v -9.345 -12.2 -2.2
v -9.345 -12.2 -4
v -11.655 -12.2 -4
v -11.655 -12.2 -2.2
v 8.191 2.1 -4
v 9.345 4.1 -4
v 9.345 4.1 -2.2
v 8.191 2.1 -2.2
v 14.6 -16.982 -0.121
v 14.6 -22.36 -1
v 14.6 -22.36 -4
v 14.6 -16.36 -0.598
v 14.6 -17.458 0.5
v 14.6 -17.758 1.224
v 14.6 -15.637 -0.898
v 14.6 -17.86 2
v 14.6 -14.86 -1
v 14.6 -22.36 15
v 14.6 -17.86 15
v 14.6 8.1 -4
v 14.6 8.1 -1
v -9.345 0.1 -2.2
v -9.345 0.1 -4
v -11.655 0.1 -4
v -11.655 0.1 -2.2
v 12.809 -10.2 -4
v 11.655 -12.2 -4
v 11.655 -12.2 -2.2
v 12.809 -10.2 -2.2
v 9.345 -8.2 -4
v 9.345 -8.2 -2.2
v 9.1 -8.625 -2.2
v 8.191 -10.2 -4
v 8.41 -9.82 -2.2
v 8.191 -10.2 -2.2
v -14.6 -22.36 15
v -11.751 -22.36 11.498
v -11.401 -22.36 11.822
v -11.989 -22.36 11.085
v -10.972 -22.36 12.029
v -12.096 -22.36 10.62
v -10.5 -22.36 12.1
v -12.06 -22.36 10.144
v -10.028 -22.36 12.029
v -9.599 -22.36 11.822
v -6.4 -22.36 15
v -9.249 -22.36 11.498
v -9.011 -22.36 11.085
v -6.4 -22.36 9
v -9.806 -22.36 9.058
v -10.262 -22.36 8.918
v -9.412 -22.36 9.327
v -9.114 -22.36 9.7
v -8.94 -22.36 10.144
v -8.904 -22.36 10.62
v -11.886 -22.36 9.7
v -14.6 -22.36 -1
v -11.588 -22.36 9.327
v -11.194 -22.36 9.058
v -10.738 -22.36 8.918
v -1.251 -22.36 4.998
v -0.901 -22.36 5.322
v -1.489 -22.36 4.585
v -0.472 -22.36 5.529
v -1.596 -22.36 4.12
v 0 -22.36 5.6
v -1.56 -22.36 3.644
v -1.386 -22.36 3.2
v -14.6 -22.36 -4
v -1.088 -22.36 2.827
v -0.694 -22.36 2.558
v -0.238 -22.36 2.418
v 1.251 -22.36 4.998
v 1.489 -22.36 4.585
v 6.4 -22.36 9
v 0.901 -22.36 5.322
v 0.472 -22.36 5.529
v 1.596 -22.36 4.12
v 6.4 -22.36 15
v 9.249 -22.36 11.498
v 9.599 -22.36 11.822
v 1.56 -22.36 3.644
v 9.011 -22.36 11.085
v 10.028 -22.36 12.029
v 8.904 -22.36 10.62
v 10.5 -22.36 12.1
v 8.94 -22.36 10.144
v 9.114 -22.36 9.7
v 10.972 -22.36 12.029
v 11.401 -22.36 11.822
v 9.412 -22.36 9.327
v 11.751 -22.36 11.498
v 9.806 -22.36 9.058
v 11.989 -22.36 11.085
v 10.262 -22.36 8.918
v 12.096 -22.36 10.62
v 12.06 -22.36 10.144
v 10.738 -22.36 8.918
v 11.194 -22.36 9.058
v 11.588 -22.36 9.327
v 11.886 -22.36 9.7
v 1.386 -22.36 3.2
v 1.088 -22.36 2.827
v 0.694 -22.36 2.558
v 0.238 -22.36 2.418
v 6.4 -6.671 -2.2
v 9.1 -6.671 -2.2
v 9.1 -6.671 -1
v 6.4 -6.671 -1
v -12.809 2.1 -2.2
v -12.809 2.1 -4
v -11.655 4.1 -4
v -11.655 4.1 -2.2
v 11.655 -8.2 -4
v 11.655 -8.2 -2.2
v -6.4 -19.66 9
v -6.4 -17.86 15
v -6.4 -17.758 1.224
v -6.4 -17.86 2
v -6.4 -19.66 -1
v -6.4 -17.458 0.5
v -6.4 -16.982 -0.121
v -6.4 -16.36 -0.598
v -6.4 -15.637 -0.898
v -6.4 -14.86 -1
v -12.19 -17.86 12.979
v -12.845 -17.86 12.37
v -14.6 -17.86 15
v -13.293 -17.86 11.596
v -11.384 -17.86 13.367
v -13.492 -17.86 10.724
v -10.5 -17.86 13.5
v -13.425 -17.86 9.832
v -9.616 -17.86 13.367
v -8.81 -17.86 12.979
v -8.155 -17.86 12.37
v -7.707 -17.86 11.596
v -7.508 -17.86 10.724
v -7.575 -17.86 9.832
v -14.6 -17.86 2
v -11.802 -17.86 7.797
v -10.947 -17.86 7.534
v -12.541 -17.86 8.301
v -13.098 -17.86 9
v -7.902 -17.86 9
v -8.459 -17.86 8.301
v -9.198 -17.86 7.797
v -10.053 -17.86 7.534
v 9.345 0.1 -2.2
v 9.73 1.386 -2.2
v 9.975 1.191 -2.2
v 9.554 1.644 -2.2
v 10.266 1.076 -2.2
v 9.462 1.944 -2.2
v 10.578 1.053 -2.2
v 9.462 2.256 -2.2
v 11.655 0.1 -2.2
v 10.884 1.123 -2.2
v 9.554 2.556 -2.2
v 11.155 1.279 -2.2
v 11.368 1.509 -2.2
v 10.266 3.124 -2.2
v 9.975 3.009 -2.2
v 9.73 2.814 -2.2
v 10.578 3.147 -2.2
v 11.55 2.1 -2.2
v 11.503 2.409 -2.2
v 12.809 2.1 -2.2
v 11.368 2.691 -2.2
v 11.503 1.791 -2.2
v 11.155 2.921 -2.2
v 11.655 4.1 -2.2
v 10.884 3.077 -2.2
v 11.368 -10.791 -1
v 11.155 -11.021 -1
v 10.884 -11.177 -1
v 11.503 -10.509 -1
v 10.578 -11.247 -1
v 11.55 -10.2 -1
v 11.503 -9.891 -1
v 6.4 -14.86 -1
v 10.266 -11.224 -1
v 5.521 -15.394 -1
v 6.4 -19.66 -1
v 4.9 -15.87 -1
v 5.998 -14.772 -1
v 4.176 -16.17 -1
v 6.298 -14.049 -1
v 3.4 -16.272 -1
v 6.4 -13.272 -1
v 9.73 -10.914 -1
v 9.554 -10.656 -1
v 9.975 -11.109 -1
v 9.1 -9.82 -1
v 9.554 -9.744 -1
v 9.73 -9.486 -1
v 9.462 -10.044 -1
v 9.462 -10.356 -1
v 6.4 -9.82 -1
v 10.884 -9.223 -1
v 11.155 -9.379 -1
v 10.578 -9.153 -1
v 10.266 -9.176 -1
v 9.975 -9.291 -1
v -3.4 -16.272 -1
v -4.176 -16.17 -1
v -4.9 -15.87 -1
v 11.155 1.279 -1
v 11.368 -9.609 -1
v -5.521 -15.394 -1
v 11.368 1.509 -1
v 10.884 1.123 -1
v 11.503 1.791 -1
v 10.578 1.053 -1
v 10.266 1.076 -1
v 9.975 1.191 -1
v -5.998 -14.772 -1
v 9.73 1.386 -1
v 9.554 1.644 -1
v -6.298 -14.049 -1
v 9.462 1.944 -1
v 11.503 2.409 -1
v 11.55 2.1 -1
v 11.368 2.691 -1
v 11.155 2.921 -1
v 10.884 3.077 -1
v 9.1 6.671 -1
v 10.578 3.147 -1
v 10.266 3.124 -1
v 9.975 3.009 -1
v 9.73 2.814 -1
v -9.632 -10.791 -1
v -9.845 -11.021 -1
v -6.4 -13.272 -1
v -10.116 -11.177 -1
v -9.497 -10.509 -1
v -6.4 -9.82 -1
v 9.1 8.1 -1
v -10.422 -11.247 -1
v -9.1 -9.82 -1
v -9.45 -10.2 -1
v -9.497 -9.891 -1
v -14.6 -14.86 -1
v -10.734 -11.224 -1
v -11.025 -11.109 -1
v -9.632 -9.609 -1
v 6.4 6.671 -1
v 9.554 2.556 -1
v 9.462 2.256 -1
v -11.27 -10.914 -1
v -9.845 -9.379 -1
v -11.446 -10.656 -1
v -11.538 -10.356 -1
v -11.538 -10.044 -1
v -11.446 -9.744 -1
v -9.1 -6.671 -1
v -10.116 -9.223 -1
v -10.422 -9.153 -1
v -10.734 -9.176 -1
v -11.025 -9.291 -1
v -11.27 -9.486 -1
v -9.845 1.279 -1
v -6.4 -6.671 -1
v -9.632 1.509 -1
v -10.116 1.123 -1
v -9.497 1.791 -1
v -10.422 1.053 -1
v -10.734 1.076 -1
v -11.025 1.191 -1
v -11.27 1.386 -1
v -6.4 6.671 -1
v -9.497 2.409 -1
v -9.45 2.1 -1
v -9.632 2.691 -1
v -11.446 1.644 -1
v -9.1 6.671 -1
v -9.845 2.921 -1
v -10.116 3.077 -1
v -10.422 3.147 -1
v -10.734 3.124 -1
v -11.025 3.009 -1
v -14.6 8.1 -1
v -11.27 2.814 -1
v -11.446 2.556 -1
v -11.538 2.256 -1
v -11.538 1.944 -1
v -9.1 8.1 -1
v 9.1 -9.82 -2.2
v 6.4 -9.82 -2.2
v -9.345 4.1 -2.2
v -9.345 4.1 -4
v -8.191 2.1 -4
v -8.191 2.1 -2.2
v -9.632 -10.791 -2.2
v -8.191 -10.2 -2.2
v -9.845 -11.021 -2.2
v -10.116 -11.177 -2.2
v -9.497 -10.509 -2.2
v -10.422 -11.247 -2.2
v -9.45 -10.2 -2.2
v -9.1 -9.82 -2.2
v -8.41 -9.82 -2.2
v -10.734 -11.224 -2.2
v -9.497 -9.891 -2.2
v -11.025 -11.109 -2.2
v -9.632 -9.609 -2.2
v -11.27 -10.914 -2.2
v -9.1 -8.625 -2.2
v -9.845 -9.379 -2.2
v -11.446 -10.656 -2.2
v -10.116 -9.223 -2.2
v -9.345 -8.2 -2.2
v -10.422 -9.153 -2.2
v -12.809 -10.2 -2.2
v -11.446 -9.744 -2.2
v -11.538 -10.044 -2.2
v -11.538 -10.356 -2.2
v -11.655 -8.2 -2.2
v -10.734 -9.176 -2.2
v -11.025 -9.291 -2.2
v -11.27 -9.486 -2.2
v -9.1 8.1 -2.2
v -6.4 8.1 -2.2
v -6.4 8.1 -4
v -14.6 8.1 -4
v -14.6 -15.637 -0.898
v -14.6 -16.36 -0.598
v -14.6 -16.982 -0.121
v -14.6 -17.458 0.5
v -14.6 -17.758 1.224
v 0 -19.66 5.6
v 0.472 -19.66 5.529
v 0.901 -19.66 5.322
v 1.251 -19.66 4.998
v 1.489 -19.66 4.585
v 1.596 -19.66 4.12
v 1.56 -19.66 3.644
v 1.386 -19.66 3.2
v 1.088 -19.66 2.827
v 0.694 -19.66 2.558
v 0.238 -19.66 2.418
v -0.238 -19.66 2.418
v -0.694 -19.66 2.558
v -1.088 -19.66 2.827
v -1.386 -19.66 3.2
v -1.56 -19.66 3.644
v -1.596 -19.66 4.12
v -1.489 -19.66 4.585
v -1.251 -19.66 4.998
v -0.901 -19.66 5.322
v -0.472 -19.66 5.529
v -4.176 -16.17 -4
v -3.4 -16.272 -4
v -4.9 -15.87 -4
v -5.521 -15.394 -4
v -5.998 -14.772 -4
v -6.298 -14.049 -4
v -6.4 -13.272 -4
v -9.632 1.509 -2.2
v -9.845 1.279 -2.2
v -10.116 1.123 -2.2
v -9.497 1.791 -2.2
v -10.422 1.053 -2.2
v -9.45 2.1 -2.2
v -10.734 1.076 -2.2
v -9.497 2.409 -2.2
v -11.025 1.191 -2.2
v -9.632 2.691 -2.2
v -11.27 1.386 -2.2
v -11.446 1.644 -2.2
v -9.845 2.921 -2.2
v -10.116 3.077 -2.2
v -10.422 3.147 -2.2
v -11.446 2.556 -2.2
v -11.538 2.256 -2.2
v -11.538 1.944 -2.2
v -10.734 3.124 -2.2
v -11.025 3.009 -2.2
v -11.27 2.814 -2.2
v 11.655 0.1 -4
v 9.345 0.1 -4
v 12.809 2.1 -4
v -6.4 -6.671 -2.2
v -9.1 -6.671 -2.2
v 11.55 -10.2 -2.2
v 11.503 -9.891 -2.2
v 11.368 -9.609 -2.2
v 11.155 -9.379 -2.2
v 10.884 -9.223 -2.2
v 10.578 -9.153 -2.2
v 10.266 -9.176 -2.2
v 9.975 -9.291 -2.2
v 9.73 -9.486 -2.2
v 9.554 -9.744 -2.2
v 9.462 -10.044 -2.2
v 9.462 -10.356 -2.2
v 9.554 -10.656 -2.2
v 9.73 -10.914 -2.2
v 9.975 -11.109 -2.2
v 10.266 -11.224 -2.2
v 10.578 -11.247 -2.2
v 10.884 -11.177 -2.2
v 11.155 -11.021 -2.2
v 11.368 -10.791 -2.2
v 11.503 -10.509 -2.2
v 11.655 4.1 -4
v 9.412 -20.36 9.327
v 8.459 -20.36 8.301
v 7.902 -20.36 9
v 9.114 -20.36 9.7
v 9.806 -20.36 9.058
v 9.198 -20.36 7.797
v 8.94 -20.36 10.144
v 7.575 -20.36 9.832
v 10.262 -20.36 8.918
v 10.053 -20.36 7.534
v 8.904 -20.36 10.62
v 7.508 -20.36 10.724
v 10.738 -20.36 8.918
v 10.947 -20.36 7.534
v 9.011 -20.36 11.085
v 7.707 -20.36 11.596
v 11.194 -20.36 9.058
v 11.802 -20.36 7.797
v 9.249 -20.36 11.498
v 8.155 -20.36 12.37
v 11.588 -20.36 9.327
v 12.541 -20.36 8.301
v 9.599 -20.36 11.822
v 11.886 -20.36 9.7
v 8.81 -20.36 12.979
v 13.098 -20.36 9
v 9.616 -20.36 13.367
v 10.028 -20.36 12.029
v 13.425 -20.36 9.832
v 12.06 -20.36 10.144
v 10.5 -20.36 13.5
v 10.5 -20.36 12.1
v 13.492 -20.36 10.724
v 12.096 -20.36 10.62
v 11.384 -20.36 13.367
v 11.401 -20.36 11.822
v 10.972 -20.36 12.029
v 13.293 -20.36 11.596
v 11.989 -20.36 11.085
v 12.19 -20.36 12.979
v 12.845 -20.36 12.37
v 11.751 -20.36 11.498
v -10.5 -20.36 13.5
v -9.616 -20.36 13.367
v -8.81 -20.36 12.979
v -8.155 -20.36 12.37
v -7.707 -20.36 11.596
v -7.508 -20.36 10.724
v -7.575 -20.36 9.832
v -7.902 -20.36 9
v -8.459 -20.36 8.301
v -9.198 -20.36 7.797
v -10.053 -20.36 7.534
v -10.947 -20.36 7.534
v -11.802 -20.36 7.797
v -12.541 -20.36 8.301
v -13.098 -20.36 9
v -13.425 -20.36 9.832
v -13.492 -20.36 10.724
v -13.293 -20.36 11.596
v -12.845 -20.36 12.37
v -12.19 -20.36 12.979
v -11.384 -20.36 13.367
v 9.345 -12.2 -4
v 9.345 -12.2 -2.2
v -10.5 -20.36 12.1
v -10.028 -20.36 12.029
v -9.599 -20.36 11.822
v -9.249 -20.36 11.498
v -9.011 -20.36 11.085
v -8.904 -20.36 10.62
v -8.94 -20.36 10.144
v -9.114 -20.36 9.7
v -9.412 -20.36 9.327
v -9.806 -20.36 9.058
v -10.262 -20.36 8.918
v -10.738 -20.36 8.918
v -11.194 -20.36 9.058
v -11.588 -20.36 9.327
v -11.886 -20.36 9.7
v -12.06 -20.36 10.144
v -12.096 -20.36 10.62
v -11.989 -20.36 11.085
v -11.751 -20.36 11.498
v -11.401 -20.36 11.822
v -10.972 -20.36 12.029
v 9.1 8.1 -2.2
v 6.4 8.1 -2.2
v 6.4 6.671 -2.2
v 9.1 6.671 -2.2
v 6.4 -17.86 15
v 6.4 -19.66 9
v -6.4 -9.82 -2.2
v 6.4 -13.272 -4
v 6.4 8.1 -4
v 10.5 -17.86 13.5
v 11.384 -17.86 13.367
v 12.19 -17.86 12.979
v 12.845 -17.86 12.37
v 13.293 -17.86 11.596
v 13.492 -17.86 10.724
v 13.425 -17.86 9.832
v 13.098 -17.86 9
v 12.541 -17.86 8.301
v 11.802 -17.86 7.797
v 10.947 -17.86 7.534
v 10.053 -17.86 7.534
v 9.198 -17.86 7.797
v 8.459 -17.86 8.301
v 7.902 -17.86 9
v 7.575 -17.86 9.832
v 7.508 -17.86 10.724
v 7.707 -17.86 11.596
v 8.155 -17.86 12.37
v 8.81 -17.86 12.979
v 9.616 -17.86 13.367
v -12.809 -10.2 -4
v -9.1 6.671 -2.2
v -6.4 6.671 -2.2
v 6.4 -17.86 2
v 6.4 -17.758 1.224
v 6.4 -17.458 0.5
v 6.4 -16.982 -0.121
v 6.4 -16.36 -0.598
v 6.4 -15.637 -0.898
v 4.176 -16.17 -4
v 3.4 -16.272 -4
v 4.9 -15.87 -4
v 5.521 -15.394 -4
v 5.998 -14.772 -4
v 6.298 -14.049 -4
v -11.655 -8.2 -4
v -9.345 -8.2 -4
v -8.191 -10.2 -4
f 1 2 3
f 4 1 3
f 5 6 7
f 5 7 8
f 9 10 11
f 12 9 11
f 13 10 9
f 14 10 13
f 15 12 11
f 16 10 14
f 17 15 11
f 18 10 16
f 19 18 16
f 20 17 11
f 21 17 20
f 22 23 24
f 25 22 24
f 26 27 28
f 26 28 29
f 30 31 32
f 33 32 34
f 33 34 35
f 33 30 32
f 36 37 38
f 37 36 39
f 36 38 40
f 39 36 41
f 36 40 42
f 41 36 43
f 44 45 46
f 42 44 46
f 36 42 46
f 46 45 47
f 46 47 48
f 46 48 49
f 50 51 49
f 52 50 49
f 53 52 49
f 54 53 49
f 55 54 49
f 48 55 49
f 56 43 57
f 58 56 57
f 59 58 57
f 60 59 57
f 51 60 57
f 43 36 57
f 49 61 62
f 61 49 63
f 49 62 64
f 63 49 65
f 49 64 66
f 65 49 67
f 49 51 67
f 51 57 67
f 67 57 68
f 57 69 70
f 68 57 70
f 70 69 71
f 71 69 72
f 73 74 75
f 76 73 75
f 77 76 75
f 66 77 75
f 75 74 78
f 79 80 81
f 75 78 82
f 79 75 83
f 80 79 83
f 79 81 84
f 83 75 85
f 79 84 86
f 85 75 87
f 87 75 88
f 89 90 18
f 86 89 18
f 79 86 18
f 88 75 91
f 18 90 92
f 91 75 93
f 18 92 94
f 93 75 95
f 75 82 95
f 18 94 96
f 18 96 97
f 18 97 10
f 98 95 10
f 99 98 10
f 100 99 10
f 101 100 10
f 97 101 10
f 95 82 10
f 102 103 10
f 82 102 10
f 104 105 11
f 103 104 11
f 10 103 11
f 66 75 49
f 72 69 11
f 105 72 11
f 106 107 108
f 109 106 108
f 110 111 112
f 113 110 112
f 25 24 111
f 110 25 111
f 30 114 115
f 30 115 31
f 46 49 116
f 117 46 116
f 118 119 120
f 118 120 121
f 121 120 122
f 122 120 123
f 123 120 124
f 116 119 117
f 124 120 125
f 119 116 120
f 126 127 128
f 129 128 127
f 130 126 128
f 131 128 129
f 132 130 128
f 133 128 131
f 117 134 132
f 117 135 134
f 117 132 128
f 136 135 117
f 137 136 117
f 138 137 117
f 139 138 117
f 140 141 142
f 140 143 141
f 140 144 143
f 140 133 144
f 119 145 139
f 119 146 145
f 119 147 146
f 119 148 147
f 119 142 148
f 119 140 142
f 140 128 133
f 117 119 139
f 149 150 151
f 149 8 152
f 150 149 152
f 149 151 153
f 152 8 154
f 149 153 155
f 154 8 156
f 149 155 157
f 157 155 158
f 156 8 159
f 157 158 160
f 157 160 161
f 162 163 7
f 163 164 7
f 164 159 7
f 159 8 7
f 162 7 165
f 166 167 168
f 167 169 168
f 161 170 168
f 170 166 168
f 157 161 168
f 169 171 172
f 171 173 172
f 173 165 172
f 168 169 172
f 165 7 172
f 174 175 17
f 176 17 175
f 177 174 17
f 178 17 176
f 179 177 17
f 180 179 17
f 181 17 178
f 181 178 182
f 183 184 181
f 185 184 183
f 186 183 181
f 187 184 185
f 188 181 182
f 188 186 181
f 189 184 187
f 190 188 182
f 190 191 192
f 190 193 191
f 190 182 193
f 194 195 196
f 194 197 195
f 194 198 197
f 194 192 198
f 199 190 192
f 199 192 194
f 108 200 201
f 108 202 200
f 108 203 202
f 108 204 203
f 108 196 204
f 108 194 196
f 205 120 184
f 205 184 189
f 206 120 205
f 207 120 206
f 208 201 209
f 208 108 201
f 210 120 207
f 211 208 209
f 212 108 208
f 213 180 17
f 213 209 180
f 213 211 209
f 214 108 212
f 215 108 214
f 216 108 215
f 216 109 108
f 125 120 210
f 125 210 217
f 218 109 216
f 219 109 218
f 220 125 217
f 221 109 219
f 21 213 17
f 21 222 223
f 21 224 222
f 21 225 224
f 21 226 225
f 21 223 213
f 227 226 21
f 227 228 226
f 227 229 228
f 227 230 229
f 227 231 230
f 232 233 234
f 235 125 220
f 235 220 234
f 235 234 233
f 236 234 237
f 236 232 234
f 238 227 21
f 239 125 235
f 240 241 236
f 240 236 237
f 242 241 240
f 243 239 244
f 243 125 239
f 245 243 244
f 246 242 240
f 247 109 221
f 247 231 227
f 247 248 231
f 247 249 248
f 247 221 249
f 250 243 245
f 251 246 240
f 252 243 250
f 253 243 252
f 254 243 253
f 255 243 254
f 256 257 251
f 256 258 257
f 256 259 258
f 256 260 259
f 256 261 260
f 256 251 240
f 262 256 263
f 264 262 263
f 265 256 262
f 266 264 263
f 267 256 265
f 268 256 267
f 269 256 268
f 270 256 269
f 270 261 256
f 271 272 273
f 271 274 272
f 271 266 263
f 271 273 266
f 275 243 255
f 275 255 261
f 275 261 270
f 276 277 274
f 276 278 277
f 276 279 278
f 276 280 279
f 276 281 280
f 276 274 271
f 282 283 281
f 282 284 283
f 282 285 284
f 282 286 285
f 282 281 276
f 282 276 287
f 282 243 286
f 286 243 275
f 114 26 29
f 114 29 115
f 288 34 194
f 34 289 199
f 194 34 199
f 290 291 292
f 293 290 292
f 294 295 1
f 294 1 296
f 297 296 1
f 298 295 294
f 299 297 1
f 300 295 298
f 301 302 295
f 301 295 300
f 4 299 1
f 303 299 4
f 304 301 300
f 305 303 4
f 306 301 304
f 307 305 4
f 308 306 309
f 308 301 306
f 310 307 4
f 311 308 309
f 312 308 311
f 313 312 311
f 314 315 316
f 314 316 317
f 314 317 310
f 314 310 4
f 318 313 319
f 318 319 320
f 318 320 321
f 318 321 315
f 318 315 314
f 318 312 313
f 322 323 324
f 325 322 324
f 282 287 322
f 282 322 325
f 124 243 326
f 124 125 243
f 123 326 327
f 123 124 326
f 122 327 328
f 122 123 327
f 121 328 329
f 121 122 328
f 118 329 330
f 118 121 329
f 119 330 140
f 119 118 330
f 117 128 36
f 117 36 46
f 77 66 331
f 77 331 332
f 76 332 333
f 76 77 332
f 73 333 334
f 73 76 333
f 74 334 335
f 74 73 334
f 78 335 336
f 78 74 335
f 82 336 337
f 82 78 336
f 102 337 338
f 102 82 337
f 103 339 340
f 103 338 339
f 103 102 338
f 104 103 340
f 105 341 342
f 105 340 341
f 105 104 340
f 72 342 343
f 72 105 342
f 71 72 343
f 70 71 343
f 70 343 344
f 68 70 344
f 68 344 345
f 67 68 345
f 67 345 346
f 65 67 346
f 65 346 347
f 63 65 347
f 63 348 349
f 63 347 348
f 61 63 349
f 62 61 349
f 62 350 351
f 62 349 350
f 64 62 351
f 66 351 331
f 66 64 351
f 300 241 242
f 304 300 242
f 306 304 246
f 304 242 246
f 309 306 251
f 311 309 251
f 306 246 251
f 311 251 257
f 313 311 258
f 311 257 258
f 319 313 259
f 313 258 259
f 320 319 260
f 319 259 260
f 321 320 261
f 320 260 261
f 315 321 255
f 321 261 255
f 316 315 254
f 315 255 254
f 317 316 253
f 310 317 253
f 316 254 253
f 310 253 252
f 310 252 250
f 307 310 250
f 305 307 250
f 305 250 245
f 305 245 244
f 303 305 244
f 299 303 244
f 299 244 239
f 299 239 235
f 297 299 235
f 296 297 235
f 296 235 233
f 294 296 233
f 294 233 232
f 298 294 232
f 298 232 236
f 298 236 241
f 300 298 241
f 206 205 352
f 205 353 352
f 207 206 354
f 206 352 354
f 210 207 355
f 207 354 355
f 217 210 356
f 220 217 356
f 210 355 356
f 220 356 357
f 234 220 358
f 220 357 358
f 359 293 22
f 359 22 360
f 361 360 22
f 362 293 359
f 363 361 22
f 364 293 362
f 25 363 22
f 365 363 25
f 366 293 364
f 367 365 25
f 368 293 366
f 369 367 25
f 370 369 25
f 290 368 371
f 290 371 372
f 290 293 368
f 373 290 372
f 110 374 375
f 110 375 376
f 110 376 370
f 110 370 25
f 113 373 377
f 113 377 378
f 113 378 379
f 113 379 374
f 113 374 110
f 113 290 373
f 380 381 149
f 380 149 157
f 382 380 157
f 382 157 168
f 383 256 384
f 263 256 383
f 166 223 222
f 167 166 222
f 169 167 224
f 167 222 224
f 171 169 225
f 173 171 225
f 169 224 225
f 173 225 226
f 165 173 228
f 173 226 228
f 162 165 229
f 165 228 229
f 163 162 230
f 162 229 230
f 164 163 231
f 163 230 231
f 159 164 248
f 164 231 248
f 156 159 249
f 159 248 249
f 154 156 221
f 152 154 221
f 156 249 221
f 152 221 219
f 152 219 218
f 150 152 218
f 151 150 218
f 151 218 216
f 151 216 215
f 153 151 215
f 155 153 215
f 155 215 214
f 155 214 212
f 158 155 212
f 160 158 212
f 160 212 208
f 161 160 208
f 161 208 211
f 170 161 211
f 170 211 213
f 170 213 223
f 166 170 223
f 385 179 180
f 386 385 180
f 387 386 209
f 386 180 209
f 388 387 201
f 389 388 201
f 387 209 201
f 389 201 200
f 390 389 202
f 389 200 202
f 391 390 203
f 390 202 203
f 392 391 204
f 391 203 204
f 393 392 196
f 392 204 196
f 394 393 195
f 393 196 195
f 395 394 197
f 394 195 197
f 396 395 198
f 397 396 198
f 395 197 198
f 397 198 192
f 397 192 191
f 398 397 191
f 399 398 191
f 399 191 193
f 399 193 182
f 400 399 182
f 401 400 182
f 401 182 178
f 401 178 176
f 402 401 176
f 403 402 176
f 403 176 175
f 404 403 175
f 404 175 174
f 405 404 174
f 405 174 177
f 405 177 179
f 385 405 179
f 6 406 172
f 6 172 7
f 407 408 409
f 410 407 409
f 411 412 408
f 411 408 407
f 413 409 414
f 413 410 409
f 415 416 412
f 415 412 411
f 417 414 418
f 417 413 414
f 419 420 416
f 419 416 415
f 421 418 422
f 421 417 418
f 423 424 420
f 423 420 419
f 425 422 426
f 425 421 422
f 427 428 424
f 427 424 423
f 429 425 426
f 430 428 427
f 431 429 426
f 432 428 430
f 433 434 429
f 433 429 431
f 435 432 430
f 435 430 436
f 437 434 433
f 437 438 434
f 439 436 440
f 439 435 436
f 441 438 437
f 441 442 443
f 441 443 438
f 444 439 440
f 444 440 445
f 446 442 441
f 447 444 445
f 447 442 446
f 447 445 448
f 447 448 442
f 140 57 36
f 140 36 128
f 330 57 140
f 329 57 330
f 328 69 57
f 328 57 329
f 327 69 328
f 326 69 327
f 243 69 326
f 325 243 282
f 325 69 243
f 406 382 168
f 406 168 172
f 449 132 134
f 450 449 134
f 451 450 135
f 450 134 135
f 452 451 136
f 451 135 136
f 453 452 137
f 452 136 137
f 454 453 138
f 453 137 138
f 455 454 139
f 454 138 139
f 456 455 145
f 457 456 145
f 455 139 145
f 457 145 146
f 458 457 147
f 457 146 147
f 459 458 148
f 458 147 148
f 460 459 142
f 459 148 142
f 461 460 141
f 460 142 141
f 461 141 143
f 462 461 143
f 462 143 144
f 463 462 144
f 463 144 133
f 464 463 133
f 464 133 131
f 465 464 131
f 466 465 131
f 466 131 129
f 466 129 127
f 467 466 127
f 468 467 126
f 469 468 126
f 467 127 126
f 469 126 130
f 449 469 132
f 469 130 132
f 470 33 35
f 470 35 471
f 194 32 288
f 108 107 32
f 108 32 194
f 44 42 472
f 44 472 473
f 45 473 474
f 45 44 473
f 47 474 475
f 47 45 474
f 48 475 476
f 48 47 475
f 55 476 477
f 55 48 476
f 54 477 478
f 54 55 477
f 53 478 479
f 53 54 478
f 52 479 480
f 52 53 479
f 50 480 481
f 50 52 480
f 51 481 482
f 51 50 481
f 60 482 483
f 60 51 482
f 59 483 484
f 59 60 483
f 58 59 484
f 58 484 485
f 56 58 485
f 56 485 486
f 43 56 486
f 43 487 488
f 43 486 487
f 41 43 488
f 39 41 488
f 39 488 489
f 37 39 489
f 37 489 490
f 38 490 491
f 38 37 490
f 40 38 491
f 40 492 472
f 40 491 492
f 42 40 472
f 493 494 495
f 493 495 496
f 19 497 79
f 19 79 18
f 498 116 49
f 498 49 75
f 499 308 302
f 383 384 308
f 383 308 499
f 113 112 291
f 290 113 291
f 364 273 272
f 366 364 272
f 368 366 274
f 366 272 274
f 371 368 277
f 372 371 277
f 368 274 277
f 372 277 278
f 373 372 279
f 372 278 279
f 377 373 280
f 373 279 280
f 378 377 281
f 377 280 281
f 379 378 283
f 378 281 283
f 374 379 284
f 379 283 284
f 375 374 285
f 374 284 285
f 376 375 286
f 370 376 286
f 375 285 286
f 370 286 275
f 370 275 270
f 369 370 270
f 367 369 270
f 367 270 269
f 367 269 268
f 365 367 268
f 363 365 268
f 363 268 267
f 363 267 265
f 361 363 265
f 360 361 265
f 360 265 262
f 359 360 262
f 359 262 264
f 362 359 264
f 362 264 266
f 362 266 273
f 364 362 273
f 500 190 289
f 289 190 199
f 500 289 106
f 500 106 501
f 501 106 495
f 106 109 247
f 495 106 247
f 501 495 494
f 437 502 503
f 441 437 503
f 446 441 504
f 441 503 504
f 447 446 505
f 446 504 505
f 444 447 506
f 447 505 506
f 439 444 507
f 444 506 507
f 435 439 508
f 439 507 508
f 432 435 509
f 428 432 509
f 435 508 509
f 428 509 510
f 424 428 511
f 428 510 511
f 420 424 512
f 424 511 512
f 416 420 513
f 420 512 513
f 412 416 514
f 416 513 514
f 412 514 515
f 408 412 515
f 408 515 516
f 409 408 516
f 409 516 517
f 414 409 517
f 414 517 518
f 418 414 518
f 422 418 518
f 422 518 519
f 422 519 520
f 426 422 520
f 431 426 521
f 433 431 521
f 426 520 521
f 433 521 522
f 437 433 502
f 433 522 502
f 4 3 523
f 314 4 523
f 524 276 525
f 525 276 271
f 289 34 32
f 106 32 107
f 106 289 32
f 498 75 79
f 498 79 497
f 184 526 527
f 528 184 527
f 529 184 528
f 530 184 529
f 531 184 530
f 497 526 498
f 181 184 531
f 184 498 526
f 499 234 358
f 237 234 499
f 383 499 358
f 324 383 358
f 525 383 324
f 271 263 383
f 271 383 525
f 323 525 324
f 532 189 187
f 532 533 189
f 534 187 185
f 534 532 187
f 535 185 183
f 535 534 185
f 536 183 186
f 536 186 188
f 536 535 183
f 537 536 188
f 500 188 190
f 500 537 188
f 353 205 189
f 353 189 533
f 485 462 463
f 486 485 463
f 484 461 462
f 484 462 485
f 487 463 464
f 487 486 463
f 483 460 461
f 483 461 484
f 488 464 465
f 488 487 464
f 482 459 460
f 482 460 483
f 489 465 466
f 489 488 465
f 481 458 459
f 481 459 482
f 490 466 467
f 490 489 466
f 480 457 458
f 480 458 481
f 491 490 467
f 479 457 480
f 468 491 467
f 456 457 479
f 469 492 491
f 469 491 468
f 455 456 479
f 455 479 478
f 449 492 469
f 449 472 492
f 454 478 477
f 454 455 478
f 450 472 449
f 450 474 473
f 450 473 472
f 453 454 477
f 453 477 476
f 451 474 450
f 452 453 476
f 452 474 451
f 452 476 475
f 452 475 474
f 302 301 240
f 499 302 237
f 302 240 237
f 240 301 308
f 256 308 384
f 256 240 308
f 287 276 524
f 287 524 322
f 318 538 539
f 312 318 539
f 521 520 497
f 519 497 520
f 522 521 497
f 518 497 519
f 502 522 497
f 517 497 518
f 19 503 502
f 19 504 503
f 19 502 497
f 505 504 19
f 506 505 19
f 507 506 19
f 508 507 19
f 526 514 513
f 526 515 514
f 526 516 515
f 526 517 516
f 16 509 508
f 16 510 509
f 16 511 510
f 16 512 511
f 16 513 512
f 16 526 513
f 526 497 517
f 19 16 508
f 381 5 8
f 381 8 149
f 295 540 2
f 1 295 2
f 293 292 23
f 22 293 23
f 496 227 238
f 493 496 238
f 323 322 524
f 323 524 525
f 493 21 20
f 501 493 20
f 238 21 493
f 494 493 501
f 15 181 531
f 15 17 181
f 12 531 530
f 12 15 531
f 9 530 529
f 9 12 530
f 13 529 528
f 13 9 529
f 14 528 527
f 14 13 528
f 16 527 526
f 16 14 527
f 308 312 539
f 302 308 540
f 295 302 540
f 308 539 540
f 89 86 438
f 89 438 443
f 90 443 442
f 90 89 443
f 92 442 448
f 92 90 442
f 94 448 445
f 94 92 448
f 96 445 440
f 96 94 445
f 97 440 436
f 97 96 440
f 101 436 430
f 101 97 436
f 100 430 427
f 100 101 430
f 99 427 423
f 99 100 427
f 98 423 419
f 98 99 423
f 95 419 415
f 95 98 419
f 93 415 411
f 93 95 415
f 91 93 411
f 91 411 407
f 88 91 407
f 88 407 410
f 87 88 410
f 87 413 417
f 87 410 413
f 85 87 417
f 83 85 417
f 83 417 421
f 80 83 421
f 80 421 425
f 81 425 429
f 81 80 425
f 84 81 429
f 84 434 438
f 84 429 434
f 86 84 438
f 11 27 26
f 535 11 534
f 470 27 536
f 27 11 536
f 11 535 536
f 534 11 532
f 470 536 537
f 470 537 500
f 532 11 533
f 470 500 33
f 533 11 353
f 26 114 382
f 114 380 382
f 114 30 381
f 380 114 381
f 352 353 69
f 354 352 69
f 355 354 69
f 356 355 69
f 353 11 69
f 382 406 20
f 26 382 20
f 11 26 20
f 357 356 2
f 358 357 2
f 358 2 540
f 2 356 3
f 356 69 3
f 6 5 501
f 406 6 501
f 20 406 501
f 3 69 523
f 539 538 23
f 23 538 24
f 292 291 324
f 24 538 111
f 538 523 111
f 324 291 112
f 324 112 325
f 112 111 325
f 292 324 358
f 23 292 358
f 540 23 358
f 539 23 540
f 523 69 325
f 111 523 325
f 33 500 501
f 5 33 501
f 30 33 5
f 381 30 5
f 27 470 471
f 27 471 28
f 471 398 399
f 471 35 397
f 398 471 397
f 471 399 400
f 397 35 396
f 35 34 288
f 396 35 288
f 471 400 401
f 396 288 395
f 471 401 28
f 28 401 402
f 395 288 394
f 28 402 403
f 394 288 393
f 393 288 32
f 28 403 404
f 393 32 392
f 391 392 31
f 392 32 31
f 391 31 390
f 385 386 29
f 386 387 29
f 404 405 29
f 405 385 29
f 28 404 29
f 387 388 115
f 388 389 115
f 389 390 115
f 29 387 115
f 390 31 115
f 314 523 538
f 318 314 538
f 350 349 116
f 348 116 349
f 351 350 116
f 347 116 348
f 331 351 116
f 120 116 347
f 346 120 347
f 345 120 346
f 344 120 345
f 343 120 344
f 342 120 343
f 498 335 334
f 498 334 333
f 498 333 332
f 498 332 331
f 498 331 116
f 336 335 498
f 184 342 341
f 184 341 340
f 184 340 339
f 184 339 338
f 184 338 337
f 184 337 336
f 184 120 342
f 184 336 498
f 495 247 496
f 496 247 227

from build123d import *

# Parameters (mm, degrees)
ESBO_O2_W                  = 8.2
ESBO_O2_H                  = 30.460387467
RESSALTO_EXTRUS_O1_DEPTH   = 3
RESSALTO_EXTRUS_O1_2_DEPTH = 3
RESSALTO_EXTRUS_O2_REACH   = 32.935
ESBO_O3_W                  = 3
ESBO_O3_H                  = 6.088150409
ESBO_O4_W                  = 12.8
ESBO_O4_H                  = 2.7
RESSALTO_EXTRUS_O3_DEPTH   = 10
ESBO_O5_W                  = 8.2
ESBO_O5_H                  = 4.5
RESSALTO_EXTRUS_O4_DEPTH   = 16
CORTE_EXTRUS_O1_DEPTH      = 34.348189118
CORTE_EXTRUS_O1_DEPTH_BACK = 34.348189118
ESBO_O6_R                  = 1.6
ESBO_O7_R                  = 3
CORTE_EXTRUS_O2_DEPTH      = 2.5
ESBO_O8_R                  = 1.05
CORTE_EXTRUS_O3_DEPTH      = 32.131124741
FILETE1_R                  = 3
ESBO_O9_W                  = 1.2
ESBO_O9_H                  = 3.148787123
CORTE_EXTRUS_O4_DEPTH      = 2.7
FILETE2_R                  = 3
CORTE_EXTRUS_O5_DEPTH      = 1.8
ESBO_O13_W                 = 2.7
ESBO_O13_H                 = 3.148787123
CORTE_EXTRUS_O7_DEPTH      = 1.2


with BuildPart() as part:
    # Esboço2 → Ressalto-extrusão1 (new body)
    with BuildSketch(Plane(origin=(0, 0, -1), x_dir=(-1, 0, 0), z_dir=(0, 0, -1))):
        with Locations((10.5, -7.130193734)):
            Rectangle(ESBO_O2_W, ESBO_O2_H)
    extrude(amount=RESSALTO_EXTRUS_O1_DEPTH)


with BuildPart() as body_2:
    # Esboço2 → Ressalto-extrus_o1 2 (new body)
    with BuildSketch(Plane(origin=(0, 0, -1), x_dir=(-1, 0, 0), z_dir=(0, 0, -1))):
        with Locations((-10.5, -7.130193734)):
            Rectangle(ESBO_O2_W, ESBO_O2_H)
    extrude(amount=RESSALTO_EXTRUS_O1_2_DEPTH)

    # Esboço3 → Ressalto-extrusão2 (add, up to next)
    with BuildSketch(Plane(origin=(-6.4, 0, 0), x_dir=(0, 0, -1), z_dir=(1, 0, 0)), mode=Mode.PRIVATE) as ressalto_extrus_o2_sk1:
        with Locations((2.5, -19.316312263)):
            Rectangle(ESBO_O3_W, ESBO_O3_H)
    ressalto_extrus_o2_tool1 = extrude(ressalto_extrus_o2_sk1.sketch, amount=RESSALTO_EXTRUS_O2_REACH, mode=Mode.PRIVATE) - body_2.part

    add(part.part)  # Ressalto-extrusão2 merges part
    add(ressalto_extrus_o2_tool1.solids().sort_by_distance((-6.4, -19.316312, -2.5))[0])

    # Esboço4 → Ressalto-extrusão3 (add)
    with BuildSketch(Plane.XY.offset(-1)):
        with Locations((0, -21.010387467)):
            Rectangle(ESBO_O4_W, ESBO_O4_H)
    extrude(amount=RESSALTO_EXTRUS_O3_DEPTH)

    # Esboço5 → Ressalto-extrusão4 (add)
    with BuildSketch(Plane.XY.offset(-1)):
        with Locations((-10.5, -20.110387467)):
            Rectangle(ESBO_O5_W, ESBO_O5_H)
        with Locations((10.5, -20.110387467)):
            Rectangle(ESBO_O5_W, ESBO_O5_H)
    extrude(amount=RESSALTO_EXTRUS_O4_DEPTH)

    # Esboço6 → Corte-extrusão1 (cut, two sides: drawn at the far end of the back side and taken through both)
    with BuildSketch(Plane(origin=(0, -17.860387467, 0), x_dir=(1, 0, 0), z_dir=(0, 1, 0)).offset(-CORTE_EXTRUS_O1_DEPTH_BACK)):
        with Locations(Location((0, -4, 0), (0, 0, 270))):
            Circle(ESBO_O6_R)
        with Locations(Location((10.5, -10.5, 0), (0, 0, 270))):
            Circle(ESBO_O6_R)
        with Locations(Location((-10.5, -10.5, 0), (0, 0, 270))):
            Circle(ESBO_O6_R)
    extrude(amount=CORTE_EXTRUS_O1_DEPTH + CORTE_EXTRUS_O1_DEPTH_BACK, mode=Mode.SUBTRACT)

    # Esboço7 → Corte-extrusão2 (cut)
    with BuildSketch(Plane(origin=(0, -17.860387467, 0), x_dir=(1, 0, 0), z_dir=(0, 1, 0))):
        with Locations(Location((10.5, -10.5, 0), (0, 0, 270))):
            Circle(ESBO_O7_R)
        with Locations(Location((-10.5, -10.5, 0), (0, 0, 270))):
            Circle(ESBO_O7_R)
    extrude(amount=-CORTE_EXTRUS_O2_DEPTH, mode=Mode.SUBTRACT)

    # Esboço8 → Corte-extrusão3 (cut, through all)
    with BuildSketch(Plane.XY.offset(-1)):
        with Locations((-10.5, 2.1)):
            Circle(ESBO_O8_R)
        with Locations((10.5, 2.1)):
            Circle(ESBO_O8_R)
        with Locations((10.5, -10.2)):
            Circle(ESBO_O8_R)
        with Locations((-10.5, -10.2)):
            Circle(ESBO_O8_R)
    extrude(amount=-CORTE_EXTRUS_O3_DEPTH, mode=Mode.SUBTRACT)

    # Filete1
    filete1_edges = [body_2.edges().sort_by_distance(p)[0] for p in [
        (6.4, -16.272237058, -2.5),
        (-6.4, -16.272237058, -2.5),
    ]]
    fillet(filete1_edges, radius=FILETE1_R)

    # Esboço9 → Corte-extrusão4 (cut)
    with BuildSketch(Plane.ZY.offset(-6.4)):
        with Locations((-1.6, -8.245598841)):
            Rectangle(ESBO_O9_W, ESBO_O9_H)
    extrude(amount=-CORTE_EXTRUS_O4_DEPTH, mode=Mode.SUBTRACT)

    # Filete2
    filete2_edges = [body_2.edges().sort_by_distance(p)[0] for p in [
        (-10.5, -17.860387467, -1),
        (10.5, -17.860387467, -1),
    ]]
    fillet(filete2_edges, radius=FILETE2_R)

    # Esboço10 → Corte-extrusão5 (cut)
    with BuildSketch(Plane(origin=(0, 0, -4), x_dir=(-1, 0, 0), z_dir=(0, 0, -1))):
        Polygon((12.809401077, 2.1), (11.654700538, 4.1), (9.345299462, 4.1), (8.190598923, 2.1), (9.345299462, 0.1), (11.654700538, 0.1), align=None)
        Polygon((12.809401077, -10.2), (11.654700538, -8.2), (9.345299462, -8.2), (8.190598923, -10.2), (9.345299462, -12.2), (11.654700538, -12.2), align=None)
        Polygon((-11.654700538, -12.2), (-12.809401077, -10.2), (-11.654700538, -8.2), (-9.345299462, -8.2), (-8.190598923, -10.2), (-9.345299462, -12.2), align=None)
        Polygon((-11.654700538, 0.1), (-12.809401077, 2.1), (-11.654700538, 4.1), (-9.345299462, 4.1), (-8.190598923, 2.1), (-9.345299462, 0.1), align=None)
    extrude(amount=-CORTE_EXTRUS_O5_DEPTH, mode=Mode.SUBTRACT)

    # Esboço13 → Corte-extrusão7 (cut)
    with BuildSketch(Plane.XY.offset(-1)):
        with Locations((7.75, -8.245598841)):
            Rectangle(ESBO_O13_W, ESBO_O13_H)
        with Locations((7.75, 8.245598841)):
            Rectangle(ESBO_O13_W, ESBO_O13_H)
        with Locations((-7.75, 8.245598841)):
            Rectangle(ESBO_O13_W, ESBO_O13_H)
        with Locations((-7.75, -8.245598841)):
            Rectangle(ESBO_O13_W, ESBO_O13_H)
    extrude(amount=-CORTE_EXTRUS_O7_DEPTH, mode=Mode.SUBTRACT)


solid = body_2.part
